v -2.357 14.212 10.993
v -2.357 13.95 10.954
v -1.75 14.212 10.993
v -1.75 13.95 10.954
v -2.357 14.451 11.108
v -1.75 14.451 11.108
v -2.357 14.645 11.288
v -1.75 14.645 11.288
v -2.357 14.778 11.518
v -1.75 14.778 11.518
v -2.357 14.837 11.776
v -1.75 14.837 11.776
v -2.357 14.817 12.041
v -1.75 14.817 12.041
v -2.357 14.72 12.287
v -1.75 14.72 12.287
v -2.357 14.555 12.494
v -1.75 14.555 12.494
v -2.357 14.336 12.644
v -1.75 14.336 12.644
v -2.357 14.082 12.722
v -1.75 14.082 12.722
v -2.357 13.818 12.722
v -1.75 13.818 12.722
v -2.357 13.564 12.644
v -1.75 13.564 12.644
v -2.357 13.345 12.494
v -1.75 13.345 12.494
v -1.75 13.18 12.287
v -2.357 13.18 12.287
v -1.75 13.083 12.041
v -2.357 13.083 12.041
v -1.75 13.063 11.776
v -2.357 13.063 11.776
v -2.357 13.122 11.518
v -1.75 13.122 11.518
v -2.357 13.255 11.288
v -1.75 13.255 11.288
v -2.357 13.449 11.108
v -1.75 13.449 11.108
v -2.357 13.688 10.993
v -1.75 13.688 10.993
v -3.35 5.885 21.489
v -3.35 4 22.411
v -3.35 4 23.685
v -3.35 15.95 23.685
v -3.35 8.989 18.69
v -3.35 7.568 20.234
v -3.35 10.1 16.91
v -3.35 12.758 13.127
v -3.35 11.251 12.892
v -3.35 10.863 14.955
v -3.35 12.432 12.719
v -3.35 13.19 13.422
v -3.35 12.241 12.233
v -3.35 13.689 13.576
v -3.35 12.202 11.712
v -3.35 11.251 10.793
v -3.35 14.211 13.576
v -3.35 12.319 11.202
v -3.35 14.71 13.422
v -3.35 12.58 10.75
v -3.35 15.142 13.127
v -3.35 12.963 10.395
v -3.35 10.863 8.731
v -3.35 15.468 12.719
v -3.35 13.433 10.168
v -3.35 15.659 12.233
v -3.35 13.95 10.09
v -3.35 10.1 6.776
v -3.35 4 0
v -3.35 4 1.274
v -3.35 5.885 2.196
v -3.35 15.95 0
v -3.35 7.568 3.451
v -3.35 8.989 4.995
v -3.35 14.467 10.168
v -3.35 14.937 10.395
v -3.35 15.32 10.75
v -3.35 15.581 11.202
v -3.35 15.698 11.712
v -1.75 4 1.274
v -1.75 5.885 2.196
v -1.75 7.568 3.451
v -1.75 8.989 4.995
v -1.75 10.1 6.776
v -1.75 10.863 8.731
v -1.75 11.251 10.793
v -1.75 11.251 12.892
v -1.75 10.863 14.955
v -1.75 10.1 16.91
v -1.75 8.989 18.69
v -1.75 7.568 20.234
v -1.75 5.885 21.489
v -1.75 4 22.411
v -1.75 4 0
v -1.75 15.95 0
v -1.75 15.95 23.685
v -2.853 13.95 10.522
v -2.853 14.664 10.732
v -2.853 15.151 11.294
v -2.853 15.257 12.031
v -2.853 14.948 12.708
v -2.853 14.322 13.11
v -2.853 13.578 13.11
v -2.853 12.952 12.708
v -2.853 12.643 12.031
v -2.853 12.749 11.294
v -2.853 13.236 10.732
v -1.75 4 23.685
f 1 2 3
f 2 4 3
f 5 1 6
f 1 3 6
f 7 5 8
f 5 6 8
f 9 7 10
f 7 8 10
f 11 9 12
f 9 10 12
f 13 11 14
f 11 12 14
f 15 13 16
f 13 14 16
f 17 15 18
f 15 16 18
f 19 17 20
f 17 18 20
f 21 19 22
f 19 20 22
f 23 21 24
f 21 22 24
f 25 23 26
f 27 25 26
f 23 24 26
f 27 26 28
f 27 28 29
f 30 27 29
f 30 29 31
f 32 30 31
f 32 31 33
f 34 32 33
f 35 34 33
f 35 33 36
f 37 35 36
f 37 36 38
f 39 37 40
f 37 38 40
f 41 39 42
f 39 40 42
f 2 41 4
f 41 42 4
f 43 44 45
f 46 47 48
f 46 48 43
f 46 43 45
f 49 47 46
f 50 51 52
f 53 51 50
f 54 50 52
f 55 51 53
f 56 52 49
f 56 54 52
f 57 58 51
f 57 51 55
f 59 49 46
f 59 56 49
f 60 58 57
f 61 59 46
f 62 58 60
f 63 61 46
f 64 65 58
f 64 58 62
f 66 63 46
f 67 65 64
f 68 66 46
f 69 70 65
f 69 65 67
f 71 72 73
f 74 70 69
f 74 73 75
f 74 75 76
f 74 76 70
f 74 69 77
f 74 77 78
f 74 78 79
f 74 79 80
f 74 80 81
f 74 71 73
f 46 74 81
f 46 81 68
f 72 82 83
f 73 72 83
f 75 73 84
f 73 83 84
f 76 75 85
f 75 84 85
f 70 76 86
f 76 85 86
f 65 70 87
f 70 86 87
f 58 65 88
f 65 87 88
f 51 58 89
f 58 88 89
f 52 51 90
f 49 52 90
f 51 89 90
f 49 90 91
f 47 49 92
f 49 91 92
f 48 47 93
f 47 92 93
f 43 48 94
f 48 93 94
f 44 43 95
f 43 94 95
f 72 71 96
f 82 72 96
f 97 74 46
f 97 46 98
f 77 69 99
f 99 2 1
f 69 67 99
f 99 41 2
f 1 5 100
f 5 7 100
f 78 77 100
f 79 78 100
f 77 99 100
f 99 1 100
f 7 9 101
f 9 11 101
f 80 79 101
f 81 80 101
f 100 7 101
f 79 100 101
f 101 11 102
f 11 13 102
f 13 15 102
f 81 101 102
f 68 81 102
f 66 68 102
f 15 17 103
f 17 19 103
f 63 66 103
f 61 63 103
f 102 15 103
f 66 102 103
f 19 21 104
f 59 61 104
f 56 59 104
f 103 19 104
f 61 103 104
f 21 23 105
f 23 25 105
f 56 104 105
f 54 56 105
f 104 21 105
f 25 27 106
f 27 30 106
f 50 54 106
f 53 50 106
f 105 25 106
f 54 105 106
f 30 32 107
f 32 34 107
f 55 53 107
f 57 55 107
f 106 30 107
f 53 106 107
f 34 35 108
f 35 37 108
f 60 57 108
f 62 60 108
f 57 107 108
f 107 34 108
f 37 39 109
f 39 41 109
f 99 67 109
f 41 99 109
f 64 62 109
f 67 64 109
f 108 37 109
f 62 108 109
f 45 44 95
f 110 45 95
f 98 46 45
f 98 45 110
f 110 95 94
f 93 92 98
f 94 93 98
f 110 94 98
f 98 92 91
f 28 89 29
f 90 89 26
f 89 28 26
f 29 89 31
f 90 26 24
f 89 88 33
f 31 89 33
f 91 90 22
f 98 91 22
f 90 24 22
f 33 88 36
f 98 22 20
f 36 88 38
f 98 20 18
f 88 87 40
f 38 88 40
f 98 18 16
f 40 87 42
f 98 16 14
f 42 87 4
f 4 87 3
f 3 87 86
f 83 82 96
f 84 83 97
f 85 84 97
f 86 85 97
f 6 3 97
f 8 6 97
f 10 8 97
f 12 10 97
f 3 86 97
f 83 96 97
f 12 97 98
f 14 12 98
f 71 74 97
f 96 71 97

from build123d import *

# Parameters (mm, degrees)
SKETCH1_W                                         = 1.6002
SKETCH1_H                                         = 11.95
BOSS_EXTRUDE1_DEPTH                               = 23.685439
CUT_EXTRUDE1_DEPTH                                = 10
CSK_FOR_0_FLAT_HEAD_SOCKET_CAP_SCREW1_D           = 1.778
CSK_FOR_0_FLAT_HEAD_SOCKET_CAP_SCREW1_DEPTH       = 3
CSK_FOR_0_FLAT_HEAD_SOCKET_CAP_SCREW1_CSINK_D     = 3.5052
CSK_FOR_0_FLAT_HEAD_SOCKET_CAP_SCREW1_CSINK_ANGLE = 82
CSK_FOR_0_FLAT_HEAD_SOCKET_CAP_SCREW1_TIP         = 0.53416509


with BuildPart() as part:
    # Sketch1 → Boss-Extrude1 (new body)
    with BuildSketch(Plane.XY):
        with Locations((-2.5501, 9.975)):
            Rectangle(SKETCH1_W, SKETCH1_H)
    extrude(amount=BOSS_EXTRUDE1_DEPTH)

    # Sketch2 → Cut-Extrude1 (cut)
    with BuildSketch(Plane(origin=(-1.75, 0, 0), x_dir=(0, 0, -1), z_dir=(1, 0, 0))):
        with BuildLine():
            Line((-22.411068255, 4), (-1.27437031, 4))
            ThreePointArc((-1.27437031, 4), (-11.842719282, 11.3), (-22.411068255, 4))
        make_face()
    extrude(amount=-CUT_EXTRUDE1_DEPTH, mode=Mode.SUBTRACT)

    # CSK for #0 Flat Head Socket Cap Screw1
    with Locations(Plane.ZY.offset(3.3502)):
        with Locations((11.842719282, 13.95)):
            CounterSinkHole(CSK_FOR_0_FLAT_HEAD_SOCKET_CAP_SCREW1_D / 2, CSK_FOR_0_FLAT_HEAD_SOCKET_CAP_SCREW1_CSINK_D / 2, depth=CSK_FOR_0_FLAT_HEAD_SOCKET_CAP_SCREW1_DEPTH, counter_sink_angle=CSK_FOR_0_FLAT_HEAD_SOCKET_CAP_SCREW1_CSINK_ANGLE)
            with Locations((0, 0, -(CSK_FOR_0_FLAT_HEAD_SOCKET_CAP_SCREW1_DEPTH + CSK_FOR_0_FLAT_HEAD_SOCKET_CAP_SCREW1_TIP / 2))):  # 118° drill point
                Cone(0, CSK_FOR_0_FLAT_HEAD_SOCKET_CAP_SCREW1_D / 2, CSK_FOR_0_FLAT_HEAD_SOCKET_CAP_SCREW1_TIP, mode=Mode.SUBTRACT)


solid = part.part
